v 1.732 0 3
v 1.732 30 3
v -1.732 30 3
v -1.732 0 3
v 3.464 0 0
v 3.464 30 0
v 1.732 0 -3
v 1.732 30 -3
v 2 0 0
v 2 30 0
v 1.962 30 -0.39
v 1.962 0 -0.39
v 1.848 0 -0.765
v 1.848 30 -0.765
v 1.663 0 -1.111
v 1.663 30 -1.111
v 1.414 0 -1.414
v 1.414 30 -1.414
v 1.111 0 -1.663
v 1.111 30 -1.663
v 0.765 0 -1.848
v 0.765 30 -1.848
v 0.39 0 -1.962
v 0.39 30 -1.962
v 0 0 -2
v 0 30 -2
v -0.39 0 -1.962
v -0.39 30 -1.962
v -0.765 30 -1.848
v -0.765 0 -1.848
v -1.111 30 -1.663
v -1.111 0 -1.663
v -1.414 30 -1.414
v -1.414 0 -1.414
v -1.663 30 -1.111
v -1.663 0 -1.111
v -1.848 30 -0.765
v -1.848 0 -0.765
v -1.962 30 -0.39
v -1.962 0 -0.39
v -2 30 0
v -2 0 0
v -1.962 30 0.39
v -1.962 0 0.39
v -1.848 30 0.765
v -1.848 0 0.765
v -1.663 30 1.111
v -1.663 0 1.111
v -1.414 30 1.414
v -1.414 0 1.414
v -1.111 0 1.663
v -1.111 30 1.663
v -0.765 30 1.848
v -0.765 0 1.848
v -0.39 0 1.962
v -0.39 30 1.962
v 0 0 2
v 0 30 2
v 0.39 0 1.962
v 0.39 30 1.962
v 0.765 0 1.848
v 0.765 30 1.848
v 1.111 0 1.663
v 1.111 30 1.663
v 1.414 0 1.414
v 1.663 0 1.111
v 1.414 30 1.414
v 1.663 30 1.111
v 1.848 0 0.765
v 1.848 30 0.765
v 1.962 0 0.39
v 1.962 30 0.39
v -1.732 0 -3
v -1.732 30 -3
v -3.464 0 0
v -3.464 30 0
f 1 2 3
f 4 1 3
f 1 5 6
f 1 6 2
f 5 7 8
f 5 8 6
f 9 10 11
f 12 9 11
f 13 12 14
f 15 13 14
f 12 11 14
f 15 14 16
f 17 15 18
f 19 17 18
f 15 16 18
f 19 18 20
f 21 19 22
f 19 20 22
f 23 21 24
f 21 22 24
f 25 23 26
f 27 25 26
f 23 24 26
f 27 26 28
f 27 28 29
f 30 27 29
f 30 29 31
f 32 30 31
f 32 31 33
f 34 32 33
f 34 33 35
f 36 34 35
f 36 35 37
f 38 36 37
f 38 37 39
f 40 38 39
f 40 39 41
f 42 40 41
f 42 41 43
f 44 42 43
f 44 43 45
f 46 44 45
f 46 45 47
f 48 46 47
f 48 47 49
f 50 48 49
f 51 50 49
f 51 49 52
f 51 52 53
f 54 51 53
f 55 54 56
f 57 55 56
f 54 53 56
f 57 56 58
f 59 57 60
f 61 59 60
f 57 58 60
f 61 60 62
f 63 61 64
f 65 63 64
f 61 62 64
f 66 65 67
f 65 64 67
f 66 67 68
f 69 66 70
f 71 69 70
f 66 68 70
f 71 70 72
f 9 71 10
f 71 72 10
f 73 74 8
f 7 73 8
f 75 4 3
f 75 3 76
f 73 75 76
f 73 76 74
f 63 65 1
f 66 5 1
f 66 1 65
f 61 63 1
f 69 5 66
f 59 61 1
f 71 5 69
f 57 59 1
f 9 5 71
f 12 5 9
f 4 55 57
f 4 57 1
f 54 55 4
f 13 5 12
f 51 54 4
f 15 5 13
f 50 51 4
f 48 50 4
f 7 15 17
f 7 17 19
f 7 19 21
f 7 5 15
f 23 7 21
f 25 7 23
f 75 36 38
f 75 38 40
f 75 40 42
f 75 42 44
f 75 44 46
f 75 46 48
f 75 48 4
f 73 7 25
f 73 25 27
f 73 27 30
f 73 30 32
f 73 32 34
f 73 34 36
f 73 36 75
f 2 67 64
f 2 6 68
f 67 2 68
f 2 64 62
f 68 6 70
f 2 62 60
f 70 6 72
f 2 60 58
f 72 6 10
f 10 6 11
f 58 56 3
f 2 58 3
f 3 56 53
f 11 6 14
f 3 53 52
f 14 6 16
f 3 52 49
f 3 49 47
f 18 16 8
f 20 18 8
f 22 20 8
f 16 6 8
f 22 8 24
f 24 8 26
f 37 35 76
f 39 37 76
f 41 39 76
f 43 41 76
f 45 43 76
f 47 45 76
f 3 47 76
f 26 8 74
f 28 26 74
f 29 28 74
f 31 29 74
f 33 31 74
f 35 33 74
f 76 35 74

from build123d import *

# Parameters (mm, degrees)
EXTRUDE_1_DEPTH                 = 30
CUT_EXTRUDE_1_REACH             = 32
SKETCH_2_R                      = 2
CUT_EXTRUDE_1_DIRECTION_2_DEPTH = 1


with BuildPart() as part:
    # 草图1 → 凸台-拉伸1 (new body)
    with BuildSketch(Plane(origin=(0, 0, 0), x_dir=(1, 0, 0), z_dir=(0, 1, 0))):
        Polygon((-1.732050808, 3), (1.732050808, 3), (3.464101615, 0), (1.732050808, -3), (-1.732050808, -3), (-3.464101615, 0), align=None)
    extrude(amount=EXTRUDE_1_DEPTH)

    # 草图2 → 切除-拉伸1 (cut, up to next)
    with BuildSketch(Plane(origin=(0, 30, 0), x_dir=(1, 0, 0), z_dir=(0, 1, 0)), mode=Mode.PRIVATE) as cut_extrude_1_sk1:
        Circle(SKETCH_2_R)
    cut_extrude_1_tool1 = extrude(cut_extrude_1_sk1.sketch, amount=-CUT_EXTRUDE_1_REACH, mode=Mode.PRIVATE) & part.part
    add(cut_extrude_1_tool1.solids().sort_by_distance((0, 30, 0))[0], mode=Mode.SUBTRACT)

    # 草图2 → 切除-拉伸1 direction 2 (cut)
    with BuildSketch(Plane(origin=(0, 30, 0), x_dir=(1, 0, 0), z_dir=(0, 1, 0))):
        Circle(SKETCH_2_R)
    extrude(amount=CUT_EXTRUDE_1_DIRECTION_2_DEPTH, mode=Mode.SUBTRACT)


solid = part.part
